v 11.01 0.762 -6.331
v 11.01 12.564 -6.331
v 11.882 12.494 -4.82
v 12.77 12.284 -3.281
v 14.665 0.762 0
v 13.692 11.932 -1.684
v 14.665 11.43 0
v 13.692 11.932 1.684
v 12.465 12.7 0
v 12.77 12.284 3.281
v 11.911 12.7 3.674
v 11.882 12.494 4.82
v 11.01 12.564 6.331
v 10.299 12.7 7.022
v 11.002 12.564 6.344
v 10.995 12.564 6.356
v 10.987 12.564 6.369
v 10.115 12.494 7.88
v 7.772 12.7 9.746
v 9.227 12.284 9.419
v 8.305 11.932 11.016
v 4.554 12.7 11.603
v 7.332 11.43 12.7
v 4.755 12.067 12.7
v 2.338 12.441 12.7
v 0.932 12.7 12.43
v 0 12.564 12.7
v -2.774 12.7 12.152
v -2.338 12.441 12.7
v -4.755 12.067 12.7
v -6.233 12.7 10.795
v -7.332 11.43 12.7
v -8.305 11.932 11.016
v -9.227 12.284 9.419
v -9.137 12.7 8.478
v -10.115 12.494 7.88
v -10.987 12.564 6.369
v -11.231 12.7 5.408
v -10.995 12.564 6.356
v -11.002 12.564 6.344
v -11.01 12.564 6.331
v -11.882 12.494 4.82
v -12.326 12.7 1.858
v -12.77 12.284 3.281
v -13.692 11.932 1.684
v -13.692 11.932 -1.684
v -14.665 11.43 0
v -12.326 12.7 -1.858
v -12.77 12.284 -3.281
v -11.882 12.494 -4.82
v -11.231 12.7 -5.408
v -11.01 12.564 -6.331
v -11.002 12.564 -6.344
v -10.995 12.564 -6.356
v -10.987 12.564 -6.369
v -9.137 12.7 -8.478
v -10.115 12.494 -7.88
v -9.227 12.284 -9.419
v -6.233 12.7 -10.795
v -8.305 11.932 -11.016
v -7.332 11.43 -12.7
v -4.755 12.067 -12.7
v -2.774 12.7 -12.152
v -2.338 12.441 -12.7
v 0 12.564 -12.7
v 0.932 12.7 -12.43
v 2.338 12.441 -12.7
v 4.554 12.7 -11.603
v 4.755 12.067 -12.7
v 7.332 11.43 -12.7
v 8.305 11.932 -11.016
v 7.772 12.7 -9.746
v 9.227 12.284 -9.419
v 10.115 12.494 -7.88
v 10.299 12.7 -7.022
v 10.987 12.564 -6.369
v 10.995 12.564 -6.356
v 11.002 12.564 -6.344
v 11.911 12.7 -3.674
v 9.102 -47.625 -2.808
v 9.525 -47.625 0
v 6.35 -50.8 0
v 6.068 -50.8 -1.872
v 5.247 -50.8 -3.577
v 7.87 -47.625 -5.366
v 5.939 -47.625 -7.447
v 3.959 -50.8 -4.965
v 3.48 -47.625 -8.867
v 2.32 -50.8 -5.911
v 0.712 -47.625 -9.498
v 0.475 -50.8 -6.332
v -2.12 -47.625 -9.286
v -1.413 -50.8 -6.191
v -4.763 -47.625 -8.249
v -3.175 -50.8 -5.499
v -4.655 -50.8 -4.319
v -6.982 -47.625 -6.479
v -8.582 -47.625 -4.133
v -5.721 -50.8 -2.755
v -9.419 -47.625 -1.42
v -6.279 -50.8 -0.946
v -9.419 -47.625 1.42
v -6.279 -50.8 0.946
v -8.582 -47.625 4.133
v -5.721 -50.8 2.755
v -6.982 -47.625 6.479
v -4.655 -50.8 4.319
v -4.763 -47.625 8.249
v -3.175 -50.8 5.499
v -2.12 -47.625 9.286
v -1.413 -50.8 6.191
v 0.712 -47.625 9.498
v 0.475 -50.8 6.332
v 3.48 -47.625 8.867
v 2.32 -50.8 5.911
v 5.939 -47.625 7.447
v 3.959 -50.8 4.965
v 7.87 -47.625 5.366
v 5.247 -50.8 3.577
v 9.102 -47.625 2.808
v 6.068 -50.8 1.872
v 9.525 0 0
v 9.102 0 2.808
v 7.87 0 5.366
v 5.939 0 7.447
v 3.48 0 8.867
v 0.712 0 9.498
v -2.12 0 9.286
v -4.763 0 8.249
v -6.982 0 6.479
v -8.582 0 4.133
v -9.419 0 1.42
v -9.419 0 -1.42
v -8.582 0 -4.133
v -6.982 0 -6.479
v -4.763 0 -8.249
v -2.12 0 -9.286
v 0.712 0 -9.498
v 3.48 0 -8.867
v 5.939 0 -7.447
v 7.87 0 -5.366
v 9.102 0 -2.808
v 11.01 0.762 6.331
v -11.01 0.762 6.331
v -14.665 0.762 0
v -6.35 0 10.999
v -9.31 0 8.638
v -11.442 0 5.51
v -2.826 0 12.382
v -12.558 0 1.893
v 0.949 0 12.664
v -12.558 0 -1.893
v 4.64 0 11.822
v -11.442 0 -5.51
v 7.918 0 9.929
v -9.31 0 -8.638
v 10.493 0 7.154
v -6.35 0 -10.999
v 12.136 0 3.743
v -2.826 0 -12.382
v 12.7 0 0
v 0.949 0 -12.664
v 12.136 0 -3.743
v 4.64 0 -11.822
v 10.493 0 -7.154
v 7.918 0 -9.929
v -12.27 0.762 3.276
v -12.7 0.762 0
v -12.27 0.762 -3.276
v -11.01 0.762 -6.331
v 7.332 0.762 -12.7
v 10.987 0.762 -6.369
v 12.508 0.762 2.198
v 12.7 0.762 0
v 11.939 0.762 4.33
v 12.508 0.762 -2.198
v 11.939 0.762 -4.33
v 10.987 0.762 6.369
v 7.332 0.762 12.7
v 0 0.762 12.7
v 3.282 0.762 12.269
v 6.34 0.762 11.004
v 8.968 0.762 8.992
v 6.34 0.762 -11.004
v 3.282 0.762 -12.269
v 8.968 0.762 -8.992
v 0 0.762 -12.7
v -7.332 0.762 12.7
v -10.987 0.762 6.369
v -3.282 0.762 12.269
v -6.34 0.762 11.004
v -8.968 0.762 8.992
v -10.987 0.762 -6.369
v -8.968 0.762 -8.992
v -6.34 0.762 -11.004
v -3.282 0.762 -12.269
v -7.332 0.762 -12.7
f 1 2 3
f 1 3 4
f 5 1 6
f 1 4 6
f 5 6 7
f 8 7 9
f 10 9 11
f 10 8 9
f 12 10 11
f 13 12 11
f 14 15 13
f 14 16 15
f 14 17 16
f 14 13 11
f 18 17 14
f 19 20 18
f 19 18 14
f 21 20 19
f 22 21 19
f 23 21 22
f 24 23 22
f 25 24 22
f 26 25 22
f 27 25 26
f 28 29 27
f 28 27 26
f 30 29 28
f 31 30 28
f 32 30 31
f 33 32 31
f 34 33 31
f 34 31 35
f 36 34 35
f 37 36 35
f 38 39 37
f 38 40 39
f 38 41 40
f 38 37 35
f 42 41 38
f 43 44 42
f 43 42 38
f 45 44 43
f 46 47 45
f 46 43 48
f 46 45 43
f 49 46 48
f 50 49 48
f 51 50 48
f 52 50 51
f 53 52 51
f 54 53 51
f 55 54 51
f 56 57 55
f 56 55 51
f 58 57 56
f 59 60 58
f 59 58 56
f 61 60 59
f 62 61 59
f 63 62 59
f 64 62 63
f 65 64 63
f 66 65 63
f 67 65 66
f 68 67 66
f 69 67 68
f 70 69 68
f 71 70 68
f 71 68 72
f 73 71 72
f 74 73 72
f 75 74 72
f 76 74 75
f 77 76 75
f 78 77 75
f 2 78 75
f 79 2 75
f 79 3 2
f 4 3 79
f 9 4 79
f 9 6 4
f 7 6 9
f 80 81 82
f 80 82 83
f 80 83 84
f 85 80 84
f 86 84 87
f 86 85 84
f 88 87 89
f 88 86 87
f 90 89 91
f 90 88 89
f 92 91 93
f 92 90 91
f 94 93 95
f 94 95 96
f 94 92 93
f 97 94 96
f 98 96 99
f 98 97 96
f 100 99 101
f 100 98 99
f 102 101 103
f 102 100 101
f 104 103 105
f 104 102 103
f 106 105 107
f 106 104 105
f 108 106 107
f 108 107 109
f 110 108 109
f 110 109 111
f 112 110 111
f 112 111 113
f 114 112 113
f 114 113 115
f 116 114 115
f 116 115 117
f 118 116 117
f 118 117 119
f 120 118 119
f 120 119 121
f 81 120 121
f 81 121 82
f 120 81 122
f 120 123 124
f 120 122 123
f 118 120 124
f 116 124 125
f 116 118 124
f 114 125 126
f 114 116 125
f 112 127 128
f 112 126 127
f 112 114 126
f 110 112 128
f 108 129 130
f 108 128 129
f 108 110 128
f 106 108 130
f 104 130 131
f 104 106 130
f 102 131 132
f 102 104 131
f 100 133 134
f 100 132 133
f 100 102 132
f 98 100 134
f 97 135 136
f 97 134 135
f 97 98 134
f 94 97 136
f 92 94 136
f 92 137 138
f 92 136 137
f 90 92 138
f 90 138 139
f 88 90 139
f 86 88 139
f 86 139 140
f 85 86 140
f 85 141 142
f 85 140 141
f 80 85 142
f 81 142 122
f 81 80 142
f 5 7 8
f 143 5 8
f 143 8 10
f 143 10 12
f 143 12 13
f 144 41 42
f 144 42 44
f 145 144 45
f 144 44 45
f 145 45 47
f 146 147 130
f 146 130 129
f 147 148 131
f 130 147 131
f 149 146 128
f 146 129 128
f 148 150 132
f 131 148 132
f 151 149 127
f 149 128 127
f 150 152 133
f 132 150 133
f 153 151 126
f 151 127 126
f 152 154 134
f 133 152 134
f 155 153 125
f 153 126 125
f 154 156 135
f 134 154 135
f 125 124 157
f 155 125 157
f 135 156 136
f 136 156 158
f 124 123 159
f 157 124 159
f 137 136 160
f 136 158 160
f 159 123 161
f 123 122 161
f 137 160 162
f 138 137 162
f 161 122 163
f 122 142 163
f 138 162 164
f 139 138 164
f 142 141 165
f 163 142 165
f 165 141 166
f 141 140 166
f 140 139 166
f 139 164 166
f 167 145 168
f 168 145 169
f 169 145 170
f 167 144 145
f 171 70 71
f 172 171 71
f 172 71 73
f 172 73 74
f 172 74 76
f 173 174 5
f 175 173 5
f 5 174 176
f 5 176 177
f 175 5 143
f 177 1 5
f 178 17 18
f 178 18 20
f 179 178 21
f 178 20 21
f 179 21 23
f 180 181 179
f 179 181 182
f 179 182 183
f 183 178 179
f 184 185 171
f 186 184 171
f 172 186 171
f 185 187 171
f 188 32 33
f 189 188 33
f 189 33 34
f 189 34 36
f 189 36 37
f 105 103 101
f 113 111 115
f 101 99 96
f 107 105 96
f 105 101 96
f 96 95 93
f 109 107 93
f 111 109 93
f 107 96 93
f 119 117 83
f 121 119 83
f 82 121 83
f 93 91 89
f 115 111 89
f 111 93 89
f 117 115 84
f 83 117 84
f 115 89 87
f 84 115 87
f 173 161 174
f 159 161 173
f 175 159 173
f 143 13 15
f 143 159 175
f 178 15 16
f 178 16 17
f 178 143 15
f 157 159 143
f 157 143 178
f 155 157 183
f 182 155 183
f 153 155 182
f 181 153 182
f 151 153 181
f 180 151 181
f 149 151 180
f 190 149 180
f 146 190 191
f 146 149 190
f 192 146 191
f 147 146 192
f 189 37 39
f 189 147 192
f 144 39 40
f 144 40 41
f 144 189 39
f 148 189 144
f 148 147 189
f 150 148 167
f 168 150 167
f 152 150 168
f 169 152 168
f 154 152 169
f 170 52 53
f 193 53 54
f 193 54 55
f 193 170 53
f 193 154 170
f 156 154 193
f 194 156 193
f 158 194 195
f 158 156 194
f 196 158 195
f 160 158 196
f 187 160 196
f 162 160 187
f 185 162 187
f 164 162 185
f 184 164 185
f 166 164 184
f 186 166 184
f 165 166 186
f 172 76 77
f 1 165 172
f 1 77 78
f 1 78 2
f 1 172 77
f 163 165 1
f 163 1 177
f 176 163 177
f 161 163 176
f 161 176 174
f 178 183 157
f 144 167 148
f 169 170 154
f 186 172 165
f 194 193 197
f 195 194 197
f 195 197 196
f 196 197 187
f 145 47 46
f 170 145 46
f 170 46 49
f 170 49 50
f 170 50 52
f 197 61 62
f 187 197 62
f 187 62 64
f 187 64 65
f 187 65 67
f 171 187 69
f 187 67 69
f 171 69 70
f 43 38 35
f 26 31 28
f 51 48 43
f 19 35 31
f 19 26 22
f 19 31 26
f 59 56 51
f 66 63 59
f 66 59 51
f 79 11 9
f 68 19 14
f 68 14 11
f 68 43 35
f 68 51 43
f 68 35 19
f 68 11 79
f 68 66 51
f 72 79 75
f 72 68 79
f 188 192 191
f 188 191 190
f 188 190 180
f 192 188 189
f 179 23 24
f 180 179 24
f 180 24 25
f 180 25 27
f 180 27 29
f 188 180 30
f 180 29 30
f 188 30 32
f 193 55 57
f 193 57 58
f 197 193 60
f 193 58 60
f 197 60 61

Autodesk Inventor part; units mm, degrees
ref_plane "YZ Plane" through (0, 0, 0) normal (1, 0, 0) x (0, 1, 0)
ref_plane "XZ Plane" through (0, 0, 0) normal (0, 1, 0) x (-1, 0, 0)
ref_plane "XY Plane" through (0, 0, 0) normal (0, 0, 1) x (1, 0, 0)
sketch "Sketch1" plane through (0, 0, 0) normal (0, 0, 1) x (1, 0, 0)
  line L0 (0, 0) -> (9.525, 0)
  line L1 (9.525, 0) -> (9.525, -50.8)
  line L2 (9.525, -50.8) -> (0, -50.8)
  line L3 (0, -50.8) -> (0, 0)
  dimension "d0" = 19.05
  dimension "d1" = 50.8
revolve "Revolution1" add sketch "Sketch1" angle 360 about axis through (0, -50.8, 0) along (0, 1, 0)
chamfer "Chamfer1" distance 3.175 angle 45 1 edges at (-9.525, -50.8, 0)
sketch "Sketch2" plane through (0, 0, 0) normal (0, 1, 0) x (1, 0, 0)
  circle A0 centre (0, 0) radius 12.7
  dimension "d6" = 25.4
extrude "Extrusion1" add sketch "Sketch2" along normal blind 12.7
sketch "Sketch3" plane through (0, 12.7, 0) normal (0, 1, 0) x (1, 0, 0)
  line L0 (14.6647, 0) -> (7.3323, -12.7)
  line L1 (7.3323, -12.7) -> (-7.3323, -12.7)
  line L2 (-7.3323, -12.7) -> (-14.6647, 0)
  line L3 (-14.6647, 0) -> (-7.3323, 12.7)
  line L4 (-7.3323, 12.7) -> (7.3323, 12.7)
  line L5 (7.3323, 12.7) -> (14.6647, 0)
  circle A0 centre (0, 0) radius 12.7 construction
  point P0 (0, 0)
  point P1 (0, 0)
extrude "Extrusion2" add sketch "Sketch3" against normal blind 11.938
sketch "Sketch4" plane through (0, 0, 0) normal (0, 0, 1) x (1, 0, 0)
  line L0 (12.465, 12.7) -> (14.6647, 12.7)
  line L1 (14.6647, 12.7) -> (14.6647, 11.43)
  line L2 (14.6647, 11.43) -> (12.465, 12.7)
  line L3 (0, -0.2588) -> (0, 1.5529) projected
  line L4 (7.3323, 0) -> (14.6647, 0) construction
  line L5 (7.3323, 12.7) -> (14.6647, 12.7) construction
  line L6 (7.3323, 12.7) -> (7.3323, 0.762) construction
  line L7 (14.6647, 12.7) -> (14.6647, 0.762) construction
  line L8 (14.6647, 12.7) -> (7.3323, 12.7) projected
  line L9 (10.9985, 0.762) -> (14.6647, 0.762) projected
  line L10 (7.3323, 0.762) -> (10.9985, 0.762) projected
  point P0 (0, 0)
  point P1 (16.2522, 7.9375)
  dimension "d11" = 30
  dimension "d17" = 1.27
revolve "Revolution2" cut sketch "Sketch4" angle 360 about axis through (0, -10, 0) along (0, 1, 0)
thread "Thread2" size "3/4-10 UNC" class "2A" standard "ANSI Unified Screw Threads" length 12.7
equation "\"diameter\" = 1.8542"
equation "\"length\" = 19.05"
properties part number "Hinge Pin" material "Steel, Carbon"
